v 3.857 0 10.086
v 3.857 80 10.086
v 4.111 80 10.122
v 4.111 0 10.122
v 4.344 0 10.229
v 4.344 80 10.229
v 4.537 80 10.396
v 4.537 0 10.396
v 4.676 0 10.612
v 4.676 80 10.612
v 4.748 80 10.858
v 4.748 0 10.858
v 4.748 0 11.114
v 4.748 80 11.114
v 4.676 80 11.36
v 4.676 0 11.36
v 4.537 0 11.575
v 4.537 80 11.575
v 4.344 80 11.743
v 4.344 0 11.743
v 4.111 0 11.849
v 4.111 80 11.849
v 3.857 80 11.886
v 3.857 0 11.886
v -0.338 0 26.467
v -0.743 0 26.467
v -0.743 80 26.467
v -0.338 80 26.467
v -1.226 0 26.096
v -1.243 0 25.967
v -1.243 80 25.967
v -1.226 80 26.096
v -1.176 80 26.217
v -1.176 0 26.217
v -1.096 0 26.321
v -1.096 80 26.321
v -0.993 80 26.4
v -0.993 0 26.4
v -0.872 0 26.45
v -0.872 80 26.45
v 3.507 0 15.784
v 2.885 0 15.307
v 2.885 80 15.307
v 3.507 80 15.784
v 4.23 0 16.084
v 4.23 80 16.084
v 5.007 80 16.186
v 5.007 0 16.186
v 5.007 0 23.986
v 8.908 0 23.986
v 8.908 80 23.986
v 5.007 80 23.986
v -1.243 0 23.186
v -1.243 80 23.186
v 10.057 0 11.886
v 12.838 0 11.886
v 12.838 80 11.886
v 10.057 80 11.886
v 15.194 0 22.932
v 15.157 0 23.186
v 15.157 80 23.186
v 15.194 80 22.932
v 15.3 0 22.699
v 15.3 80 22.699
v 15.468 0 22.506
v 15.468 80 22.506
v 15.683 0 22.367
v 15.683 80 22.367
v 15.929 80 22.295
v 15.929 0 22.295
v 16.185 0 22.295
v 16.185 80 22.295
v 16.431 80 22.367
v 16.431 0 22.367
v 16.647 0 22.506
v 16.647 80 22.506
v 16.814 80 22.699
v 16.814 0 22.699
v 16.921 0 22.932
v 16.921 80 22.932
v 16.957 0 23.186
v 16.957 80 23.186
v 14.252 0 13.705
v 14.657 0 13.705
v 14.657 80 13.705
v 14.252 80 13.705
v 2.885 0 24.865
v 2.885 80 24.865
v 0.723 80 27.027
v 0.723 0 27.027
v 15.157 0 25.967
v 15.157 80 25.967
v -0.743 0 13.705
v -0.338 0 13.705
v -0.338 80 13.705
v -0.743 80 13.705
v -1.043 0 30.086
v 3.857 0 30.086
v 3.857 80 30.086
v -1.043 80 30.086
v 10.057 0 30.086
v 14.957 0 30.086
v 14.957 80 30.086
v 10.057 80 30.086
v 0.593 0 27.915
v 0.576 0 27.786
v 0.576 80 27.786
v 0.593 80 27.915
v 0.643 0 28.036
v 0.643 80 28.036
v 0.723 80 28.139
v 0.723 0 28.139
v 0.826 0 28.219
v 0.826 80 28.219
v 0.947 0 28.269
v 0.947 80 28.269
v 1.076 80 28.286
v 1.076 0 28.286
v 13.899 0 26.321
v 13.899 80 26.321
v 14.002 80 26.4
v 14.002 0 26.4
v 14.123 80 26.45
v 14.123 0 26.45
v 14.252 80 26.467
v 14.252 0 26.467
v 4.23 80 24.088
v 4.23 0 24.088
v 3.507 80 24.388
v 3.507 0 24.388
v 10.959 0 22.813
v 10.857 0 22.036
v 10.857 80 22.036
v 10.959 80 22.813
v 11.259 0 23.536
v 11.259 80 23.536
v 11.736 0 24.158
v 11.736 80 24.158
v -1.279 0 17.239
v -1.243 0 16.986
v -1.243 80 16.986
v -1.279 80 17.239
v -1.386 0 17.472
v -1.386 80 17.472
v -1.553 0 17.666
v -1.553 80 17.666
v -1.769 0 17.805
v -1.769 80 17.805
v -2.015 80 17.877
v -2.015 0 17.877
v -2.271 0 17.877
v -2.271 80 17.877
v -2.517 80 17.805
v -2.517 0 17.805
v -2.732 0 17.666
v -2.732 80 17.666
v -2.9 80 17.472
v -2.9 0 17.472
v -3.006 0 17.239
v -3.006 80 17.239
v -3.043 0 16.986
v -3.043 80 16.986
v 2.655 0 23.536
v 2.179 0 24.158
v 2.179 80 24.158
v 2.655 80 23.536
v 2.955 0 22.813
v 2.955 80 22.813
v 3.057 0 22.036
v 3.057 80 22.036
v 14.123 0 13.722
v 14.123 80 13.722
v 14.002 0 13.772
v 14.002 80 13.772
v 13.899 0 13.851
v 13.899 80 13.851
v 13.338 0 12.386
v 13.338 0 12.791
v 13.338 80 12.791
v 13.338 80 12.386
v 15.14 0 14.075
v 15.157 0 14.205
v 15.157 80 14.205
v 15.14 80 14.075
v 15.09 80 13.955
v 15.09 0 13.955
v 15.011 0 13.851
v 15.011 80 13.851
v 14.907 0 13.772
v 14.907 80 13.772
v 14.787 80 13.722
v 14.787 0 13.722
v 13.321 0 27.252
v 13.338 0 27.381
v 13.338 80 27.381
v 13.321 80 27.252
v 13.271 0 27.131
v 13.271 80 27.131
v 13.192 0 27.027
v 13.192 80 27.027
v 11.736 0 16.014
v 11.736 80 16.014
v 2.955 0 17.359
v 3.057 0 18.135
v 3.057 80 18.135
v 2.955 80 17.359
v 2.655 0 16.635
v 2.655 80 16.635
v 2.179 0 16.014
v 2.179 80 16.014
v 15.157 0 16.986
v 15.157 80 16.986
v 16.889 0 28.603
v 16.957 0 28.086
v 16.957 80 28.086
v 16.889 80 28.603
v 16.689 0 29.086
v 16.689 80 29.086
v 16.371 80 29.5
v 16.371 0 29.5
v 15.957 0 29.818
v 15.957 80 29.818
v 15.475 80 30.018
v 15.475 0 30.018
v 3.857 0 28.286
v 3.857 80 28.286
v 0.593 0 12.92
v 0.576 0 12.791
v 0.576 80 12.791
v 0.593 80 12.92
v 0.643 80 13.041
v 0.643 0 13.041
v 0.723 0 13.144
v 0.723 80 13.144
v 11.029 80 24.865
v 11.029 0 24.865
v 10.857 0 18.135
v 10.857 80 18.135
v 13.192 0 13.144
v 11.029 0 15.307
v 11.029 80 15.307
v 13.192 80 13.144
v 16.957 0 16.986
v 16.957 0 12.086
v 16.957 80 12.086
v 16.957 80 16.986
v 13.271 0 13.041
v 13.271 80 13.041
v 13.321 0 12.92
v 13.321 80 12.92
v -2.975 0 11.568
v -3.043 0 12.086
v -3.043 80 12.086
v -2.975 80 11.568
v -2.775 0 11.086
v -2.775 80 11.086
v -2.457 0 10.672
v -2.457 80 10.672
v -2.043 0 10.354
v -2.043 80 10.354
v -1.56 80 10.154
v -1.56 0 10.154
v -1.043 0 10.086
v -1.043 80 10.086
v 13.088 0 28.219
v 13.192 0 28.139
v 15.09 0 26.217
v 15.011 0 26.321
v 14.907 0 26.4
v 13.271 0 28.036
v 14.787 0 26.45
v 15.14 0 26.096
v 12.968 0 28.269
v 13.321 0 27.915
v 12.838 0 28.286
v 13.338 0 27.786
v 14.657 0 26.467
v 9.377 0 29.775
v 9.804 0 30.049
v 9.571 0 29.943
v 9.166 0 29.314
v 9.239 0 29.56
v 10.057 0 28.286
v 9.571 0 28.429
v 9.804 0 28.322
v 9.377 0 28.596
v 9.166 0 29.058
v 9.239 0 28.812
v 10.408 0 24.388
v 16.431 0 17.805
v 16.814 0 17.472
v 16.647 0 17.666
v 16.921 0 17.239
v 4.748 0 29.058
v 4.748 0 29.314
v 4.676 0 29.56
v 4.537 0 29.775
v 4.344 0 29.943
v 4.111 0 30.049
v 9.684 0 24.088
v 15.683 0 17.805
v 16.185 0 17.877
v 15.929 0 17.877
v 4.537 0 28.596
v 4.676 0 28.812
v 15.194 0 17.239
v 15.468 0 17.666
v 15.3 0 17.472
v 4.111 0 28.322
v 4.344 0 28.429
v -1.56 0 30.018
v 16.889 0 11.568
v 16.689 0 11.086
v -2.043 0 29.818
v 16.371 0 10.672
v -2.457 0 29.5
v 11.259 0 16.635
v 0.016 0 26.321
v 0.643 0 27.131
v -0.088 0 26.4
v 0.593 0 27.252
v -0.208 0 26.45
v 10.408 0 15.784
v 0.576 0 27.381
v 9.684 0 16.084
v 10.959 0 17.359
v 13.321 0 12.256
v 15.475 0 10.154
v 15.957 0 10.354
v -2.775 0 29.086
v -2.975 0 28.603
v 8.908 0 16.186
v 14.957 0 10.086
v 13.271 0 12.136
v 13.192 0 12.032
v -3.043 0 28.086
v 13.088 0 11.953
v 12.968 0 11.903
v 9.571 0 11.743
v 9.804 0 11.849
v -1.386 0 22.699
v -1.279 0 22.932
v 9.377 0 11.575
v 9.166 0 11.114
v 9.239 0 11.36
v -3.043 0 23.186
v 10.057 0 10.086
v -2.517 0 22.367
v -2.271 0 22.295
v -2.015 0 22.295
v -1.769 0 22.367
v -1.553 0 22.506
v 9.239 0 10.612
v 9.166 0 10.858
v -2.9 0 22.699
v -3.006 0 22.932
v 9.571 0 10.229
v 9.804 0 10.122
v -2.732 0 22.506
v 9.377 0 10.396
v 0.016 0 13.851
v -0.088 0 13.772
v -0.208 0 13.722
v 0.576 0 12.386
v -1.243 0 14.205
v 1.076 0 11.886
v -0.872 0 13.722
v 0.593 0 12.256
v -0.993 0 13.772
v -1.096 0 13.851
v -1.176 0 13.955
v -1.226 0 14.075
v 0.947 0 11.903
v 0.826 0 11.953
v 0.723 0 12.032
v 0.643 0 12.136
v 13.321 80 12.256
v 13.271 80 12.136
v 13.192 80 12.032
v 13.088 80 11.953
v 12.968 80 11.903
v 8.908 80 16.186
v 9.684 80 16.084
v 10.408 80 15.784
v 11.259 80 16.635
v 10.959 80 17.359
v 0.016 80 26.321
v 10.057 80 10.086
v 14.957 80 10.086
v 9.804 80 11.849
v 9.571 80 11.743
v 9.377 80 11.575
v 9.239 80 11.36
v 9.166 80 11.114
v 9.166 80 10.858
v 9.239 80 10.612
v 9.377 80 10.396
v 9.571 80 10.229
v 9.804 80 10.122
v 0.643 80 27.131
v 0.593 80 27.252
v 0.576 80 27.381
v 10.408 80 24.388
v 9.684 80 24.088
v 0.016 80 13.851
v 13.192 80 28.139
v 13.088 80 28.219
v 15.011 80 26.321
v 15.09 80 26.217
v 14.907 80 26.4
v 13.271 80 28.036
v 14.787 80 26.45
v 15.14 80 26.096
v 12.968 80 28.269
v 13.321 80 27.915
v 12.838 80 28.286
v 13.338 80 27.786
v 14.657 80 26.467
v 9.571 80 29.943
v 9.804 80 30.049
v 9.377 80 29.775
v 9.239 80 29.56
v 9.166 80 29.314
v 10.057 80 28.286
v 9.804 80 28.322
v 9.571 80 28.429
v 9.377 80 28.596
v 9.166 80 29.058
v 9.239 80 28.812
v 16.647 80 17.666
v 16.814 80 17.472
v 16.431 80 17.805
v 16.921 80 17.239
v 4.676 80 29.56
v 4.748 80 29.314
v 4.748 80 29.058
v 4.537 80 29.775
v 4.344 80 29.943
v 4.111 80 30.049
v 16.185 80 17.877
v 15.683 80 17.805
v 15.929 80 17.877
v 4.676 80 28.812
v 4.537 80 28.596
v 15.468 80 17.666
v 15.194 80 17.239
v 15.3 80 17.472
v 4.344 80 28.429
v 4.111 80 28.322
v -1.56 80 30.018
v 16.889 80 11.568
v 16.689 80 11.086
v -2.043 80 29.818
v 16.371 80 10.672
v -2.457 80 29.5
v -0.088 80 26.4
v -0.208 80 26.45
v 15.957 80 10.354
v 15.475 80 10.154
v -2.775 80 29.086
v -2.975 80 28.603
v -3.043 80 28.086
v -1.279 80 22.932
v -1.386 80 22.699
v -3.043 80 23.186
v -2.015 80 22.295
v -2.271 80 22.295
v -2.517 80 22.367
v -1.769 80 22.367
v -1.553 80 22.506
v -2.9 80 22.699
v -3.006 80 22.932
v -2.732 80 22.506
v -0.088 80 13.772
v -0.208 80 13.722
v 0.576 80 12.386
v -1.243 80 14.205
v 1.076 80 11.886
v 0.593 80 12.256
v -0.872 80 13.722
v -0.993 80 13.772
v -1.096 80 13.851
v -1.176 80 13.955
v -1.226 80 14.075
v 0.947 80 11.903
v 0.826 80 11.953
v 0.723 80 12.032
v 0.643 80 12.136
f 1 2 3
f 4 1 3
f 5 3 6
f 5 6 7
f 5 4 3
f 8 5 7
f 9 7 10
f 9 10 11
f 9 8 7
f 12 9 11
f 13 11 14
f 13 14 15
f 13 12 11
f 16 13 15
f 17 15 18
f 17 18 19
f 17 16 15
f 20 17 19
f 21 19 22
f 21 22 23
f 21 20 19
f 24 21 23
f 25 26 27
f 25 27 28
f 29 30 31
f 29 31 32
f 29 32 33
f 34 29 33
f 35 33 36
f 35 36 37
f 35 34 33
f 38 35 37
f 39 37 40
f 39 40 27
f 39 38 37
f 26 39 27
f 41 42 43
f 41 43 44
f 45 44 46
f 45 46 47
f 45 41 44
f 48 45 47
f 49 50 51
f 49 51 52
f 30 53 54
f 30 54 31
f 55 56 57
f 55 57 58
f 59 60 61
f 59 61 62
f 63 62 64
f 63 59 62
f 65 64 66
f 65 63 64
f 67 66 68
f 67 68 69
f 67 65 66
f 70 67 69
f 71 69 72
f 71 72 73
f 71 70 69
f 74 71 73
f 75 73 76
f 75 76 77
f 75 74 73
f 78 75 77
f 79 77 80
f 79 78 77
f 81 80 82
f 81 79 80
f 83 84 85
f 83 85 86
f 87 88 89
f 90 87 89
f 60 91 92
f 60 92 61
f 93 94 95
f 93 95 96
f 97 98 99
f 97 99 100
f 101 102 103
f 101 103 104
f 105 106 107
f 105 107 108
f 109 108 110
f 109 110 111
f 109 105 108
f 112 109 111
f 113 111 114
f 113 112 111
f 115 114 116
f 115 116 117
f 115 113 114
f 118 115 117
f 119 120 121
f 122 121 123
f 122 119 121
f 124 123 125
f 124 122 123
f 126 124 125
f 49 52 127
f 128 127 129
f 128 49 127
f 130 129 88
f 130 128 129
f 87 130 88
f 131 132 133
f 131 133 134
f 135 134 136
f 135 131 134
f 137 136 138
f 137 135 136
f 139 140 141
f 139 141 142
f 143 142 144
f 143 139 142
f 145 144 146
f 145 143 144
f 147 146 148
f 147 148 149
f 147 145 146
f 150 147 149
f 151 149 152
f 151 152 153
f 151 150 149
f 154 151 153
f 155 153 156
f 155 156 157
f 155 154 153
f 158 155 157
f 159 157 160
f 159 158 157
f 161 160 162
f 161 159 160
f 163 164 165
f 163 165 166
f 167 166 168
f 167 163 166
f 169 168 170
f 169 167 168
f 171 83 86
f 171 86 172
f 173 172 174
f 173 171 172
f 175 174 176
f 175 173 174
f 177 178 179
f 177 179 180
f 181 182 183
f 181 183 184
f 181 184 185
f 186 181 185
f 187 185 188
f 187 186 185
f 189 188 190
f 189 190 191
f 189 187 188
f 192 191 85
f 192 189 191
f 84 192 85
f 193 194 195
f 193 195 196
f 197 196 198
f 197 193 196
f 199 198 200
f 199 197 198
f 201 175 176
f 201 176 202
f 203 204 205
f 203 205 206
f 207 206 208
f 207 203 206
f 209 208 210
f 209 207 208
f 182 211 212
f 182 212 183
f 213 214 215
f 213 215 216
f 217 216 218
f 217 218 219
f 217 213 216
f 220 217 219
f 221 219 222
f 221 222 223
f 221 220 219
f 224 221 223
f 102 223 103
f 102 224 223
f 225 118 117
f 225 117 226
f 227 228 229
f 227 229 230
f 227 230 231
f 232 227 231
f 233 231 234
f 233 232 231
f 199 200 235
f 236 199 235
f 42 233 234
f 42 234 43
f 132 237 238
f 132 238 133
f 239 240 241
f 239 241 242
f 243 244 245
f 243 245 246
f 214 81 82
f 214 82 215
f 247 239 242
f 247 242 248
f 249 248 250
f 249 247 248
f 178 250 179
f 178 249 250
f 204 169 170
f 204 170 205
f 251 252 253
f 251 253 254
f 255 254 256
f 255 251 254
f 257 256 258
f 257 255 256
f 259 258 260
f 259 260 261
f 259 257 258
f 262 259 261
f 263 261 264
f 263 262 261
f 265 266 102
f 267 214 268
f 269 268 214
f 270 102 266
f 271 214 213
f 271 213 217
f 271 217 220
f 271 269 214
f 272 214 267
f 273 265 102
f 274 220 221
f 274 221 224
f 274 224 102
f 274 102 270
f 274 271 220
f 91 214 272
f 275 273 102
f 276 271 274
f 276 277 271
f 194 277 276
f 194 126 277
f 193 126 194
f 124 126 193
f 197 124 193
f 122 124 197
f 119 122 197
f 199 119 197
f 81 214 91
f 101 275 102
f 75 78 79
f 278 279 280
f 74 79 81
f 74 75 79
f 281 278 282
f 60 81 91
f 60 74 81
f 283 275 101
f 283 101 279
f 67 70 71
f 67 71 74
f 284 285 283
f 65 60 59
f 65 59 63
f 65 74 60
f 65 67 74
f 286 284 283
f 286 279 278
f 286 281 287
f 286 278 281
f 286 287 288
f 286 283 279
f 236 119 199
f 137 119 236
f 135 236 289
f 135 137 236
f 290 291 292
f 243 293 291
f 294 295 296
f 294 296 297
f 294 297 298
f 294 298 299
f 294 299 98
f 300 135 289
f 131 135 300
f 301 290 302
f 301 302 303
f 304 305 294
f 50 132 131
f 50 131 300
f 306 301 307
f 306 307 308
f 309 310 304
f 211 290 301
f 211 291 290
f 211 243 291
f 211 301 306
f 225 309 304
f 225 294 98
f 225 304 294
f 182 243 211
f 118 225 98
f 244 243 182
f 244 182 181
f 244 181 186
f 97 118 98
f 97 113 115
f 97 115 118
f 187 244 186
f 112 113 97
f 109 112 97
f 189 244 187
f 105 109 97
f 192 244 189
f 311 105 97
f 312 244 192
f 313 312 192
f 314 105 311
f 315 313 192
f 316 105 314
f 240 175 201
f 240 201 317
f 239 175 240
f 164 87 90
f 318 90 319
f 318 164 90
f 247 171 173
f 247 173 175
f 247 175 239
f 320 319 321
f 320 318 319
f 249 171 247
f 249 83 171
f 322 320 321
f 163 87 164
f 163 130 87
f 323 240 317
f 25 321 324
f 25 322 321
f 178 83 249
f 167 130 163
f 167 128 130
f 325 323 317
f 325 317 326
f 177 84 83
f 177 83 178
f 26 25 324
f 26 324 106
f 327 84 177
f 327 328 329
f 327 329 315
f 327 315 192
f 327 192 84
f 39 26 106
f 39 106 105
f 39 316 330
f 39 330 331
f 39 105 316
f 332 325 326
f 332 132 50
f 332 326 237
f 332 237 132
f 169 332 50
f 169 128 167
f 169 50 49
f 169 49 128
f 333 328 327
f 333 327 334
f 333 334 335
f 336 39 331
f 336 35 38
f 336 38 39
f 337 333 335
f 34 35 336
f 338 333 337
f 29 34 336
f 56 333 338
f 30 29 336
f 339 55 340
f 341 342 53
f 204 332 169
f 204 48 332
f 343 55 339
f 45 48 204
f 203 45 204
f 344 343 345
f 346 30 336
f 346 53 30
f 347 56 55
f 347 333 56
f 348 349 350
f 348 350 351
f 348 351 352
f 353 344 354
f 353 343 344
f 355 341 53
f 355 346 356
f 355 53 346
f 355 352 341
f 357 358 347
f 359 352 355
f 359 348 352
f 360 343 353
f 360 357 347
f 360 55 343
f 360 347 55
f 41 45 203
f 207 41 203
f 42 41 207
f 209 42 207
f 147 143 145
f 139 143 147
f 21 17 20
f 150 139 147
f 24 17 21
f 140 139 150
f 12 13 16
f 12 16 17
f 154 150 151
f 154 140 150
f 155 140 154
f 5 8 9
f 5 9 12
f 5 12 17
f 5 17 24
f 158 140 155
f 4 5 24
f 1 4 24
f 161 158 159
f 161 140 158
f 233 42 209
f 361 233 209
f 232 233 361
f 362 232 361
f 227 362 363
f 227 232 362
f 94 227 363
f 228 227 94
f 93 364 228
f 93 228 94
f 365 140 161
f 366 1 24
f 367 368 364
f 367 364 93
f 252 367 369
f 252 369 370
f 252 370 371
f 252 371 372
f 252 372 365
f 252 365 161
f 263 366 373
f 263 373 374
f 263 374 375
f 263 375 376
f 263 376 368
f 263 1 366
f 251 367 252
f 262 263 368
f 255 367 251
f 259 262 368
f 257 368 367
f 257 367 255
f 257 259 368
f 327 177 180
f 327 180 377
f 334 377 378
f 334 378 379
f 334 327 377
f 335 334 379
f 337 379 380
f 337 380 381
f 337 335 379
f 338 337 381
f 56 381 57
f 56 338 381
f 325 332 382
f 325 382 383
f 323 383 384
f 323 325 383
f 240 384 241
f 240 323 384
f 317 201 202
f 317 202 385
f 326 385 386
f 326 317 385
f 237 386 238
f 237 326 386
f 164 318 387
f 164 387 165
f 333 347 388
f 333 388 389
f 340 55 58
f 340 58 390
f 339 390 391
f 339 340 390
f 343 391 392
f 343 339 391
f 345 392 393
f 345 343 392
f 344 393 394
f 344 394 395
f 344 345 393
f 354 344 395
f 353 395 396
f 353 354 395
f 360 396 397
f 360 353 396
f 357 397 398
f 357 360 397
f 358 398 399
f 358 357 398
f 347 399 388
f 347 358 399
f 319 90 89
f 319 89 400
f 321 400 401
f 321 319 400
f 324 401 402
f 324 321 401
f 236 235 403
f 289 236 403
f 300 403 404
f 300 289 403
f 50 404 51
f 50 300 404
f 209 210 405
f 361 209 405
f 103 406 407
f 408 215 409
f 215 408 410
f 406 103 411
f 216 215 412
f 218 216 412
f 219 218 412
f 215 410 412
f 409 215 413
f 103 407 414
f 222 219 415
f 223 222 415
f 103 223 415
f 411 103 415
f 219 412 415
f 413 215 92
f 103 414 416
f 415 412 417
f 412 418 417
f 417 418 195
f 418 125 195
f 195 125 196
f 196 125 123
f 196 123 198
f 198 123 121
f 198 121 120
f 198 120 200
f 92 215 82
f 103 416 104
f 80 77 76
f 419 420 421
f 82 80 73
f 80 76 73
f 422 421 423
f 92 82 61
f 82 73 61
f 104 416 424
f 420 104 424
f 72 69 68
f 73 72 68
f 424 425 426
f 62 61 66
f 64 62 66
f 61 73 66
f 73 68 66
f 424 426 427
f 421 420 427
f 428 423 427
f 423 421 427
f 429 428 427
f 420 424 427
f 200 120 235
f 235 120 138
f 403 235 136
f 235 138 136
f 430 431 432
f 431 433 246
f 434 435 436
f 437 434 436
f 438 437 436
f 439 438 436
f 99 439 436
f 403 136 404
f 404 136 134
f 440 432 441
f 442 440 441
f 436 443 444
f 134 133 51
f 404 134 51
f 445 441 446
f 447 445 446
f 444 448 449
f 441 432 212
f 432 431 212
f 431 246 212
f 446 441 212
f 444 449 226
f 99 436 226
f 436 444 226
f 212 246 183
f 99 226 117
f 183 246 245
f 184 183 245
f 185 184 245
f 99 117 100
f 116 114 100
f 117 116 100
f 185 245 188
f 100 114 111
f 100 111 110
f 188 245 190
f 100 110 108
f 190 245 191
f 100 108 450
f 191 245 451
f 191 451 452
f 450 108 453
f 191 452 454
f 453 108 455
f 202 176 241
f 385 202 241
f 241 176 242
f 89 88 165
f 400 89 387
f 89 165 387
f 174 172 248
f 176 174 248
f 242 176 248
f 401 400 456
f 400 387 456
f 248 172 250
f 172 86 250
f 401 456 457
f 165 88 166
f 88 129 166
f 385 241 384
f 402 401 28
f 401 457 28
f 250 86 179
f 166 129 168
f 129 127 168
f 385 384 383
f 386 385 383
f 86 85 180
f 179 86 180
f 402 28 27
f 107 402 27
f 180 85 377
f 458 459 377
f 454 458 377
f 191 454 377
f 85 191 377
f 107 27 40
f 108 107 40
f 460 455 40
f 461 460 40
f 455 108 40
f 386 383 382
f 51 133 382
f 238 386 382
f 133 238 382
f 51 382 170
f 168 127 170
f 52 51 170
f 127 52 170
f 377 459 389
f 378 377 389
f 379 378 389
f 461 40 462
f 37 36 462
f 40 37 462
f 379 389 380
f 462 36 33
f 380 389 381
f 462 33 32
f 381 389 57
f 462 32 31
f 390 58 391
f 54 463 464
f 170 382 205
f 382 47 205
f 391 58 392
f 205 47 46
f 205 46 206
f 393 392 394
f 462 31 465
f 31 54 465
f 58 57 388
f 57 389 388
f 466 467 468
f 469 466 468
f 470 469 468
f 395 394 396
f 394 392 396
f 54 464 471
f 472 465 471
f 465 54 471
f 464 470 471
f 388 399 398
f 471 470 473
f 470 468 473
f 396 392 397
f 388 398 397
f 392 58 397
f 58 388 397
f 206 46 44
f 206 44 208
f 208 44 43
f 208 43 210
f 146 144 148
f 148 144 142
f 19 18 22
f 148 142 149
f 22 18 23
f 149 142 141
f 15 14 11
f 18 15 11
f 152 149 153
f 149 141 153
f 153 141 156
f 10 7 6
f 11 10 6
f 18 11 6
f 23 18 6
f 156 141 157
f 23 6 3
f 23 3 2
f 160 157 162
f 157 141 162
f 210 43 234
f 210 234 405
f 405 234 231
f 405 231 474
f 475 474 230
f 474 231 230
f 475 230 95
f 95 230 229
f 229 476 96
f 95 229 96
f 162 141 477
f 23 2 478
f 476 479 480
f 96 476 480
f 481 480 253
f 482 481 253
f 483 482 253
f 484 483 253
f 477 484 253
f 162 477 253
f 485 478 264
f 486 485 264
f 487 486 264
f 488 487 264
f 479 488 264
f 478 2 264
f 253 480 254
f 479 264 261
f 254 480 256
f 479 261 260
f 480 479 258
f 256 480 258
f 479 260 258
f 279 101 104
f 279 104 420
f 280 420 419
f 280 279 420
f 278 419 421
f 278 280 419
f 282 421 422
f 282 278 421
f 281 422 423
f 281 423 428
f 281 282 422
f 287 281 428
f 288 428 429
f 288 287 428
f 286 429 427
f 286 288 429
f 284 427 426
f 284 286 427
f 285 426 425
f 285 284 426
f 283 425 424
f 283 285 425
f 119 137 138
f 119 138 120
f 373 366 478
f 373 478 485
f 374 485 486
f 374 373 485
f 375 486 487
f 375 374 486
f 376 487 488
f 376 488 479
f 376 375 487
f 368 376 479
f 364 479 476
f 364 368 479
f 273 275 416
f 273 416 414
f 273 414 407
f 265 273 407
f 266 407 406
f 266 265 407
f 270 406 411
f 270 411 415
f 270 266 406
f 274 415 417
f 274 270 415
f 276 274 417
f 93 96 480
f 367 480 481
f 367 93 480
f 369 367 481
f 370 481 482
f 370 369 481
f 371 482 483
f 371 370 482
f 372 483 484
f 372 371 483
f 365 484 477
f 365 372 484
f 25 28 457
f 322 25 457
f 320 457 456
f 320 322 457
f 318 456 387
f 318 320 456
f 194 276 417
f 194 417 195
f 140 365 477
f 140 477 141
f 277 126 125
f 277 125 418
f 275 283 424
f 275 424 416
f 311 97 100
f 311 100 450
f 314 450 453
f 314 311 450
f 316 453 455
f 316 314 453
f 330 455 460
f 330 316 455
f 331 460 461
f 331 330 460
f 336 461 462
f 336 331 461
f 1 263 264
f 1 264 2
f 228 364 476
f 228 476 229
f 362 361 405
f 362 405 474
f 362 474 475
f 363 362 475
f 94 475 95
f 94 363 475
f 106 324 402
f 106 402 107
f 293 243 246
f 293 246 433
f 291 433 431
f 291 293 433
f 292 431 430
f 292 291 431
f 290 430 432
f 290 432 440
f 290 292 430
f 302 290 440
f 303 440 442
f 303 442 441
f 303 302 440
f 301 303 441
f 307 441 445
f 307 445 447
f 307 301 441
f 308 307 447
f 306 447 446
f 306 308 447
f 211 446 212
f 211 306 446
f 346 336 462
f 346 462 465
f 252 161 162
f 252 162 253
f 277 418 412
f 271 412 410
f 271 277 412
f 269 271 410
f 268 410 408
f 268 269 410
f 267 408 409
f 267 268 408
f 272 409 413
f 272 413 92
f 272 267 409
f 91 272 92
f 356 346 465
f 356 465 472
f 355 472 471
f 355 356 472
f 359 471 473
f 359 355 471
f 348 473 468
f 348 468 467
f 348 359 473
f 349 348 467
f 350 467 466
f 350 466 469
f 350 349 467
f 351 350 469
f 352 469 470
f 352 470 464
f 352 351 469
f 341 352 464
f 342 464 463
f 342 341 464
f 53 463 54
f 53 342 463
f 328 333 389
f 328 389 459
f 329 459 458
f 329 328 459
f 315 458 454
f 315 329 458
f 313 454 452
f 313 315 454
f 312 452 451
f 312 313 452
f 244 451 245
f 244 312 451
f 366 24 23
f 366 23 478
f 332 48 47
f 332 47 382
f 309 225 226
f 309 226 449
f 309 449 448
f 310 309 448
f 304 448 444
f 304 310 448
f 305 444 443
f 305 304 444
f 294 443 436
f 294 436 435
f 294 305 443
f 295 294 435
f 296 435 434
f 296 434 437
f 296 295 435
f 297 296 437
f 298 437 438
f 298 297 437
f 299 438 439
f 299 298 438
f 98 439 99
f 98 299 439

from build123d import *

# Parameters (mm, degrees)
EXTRUDE_1_DEPTH = 80


with BuildPart() as part:
    # 草图1 → 凸台-拉伸1 (new body)
    with BuildSketch(Plane(origin=(0, 0, 0), x_dir=(1, 0, 0), z_dir=(0, 1, 0))):
        with BuildLine():
            Line((-1.042752475, -10.085861632), (3.857247525, -10.085861632))
            ThreePointArc((3.857247525, -10.085861632), (4.757247525, -10.985861632), (3.857247525, -11.885861632))
            Line((3.857247525, -11.885861632), (1.076161722, -11.885861632))
            ThreePointArc((1.076161722, -11.885861632), (0.722608332, -12.032308241), (0.576161722, -12.385861632))
            Line((0.576161722, -12.385861632), (0.576161722, -12.790788968))
            ThreePointArc((0.576161722, -12.790788968), (0.614221956, -12.982130685), (0.722608332, -13.144342359))
            Line((0.722608332, -13.144342359), (2.885447948, -15.307181975))
            ThreePointArc((2.885447948, -15.307181975), (3.858717994, -15.957500229), (5.006768291, -16.185861632))
            Line((5.006768291, -16.185861632), (8.907726758, -16.185861632))
            ThreePointArc((8.907726758, -16.185861632), (10.055777055, -15.957500229), (11.029047102, -15.307181975))
            Line((11.029047102, -15.307181975), (13.191886718, -13.144342359))
            ThreePointArc((13.191886718, -13.144342359), (13.300273094, -12.982130685), (13.338333327, -12.790788968))
            Line((13.338333327, -12.790788968), (13.338333327, -12.385861632))
            ThreePointArc((13.338333327, -12.385861632), (13.191886718, -12.032308241), (12.838333327, -11.885861632))
            Line((12.838333327, -11.885861632), (10.057247525, -11.885861632))
            ThreePointArc((10.057247525, -11.885861632), (9.157247525, -10.985861632), (10.057247525, -10.085861632))
            Line((10.057247525, -10.085861632), (14.957247525, -10.085861632))
            ThreePointArc((14.957247525, -10.085861632), (16.371461087, -10.671648069), (16.957247525, -12.085861632))
            Line((16.957247525, -12.085861632), (16.957247525, -16.985861632))
            ThreePointArc((16.957247525, -16.985861632), (16.057247525, -17.885861632), (15.157247525, -16.985861632))
            Line((15.157247525, -16.985861632), (15.157247525, -14.204775829))
            ThreePointArc((15.157247525, -14.204775829), (15.010800915, -13.851222438), (14.657247525, -13.704775829))
            Line((14.657247525, -13.704775829), (14.252320188, -13.704775829))
            ThreePointArc((14.252320188, -13.704775829), (14.060978472, -13.742836063), (13.898766797, -13.851222438))
            Line((13.898766797, -13.851222438), (11.735927181, -16.014062054))
            ThreePointArc((11.735927181, -16.014062054), (11.085608927, -16.987332101), (10.857247525, -18.135382398))
            Line((10.857247525, -18.135382398), (10.857247525, -22.036340865))
            ThreePointArc((10.857247525, -22.036340865), (11.085608927, -23.184391162), (11.735927181, -24.157661209))
            Line((11.735927181, -24.157661209), (13.898766797, -26.320500825))
            ThreePointArc((13.898766797, -26.320500825), (14.060978472, -26.4288872), (14.252320188, -26.466947434))
            Line((14.252320188, -26.466947434), (14.657247525, -26.466947434))
            ThreePointArc((14.657247525, -26.466947434), (15.010800915, -26.320500825), (15.157247525, -25.966947434))
            Line((15.157247525, -25.966947434), (15.157247525, -23.185861632))
            ThreePointArc((15.157247525, -23.185861632), (16.057247525, -22.285861632), (16.957247525, -23.185861632))
            Line((16.957247525, -23.185861632), (16.957247525, -28.085861632))
            ThreePointArc((16.957247525, -28.085861632), (16.371461087, -29.500075194), (14.957247525, -30.085861632))
            Line((14.957247525, -30.085861632), (10.057247525, -30.085861632))
            ThreePointArc((10.057247525, -30.085861632), (9.157247525, -29.185861632), (10.057247525, -28.285861632))
            Line((10.057247525, -28.285861632), (12.838333327, -28.285861632))
            ThreePointArc((12.838333327, -28.285861632), (13.191886718, -28.139415022), (13.338333327, -27.785861632))
            Line((13.338333327, -27.785861632), (13.338333327, -27.380934295))
            ThreePointArc((13.338333327, -27.380934295), (13.300273094, -27.189592579), (13.191886718, -27.027380904))
            Line((13.191886718, -27.027380904), (11.029047102, -24.864541288))
            ThreePointArc((11.029047102, -24.864541288), (10.055777055, -24.214223034), (8.907726758, -23.985861632))
            Line((8.907726758, -23.985861632), (5.006768291, -23.985861632))
            ThreePointArc((5.006768291, -23.985861632), (3.858717994, -24.214223034), (2.885447948, -24.864541288))
            Line((2.885447948, -24.864541288), (0.722608332, -27.027380904))
            ThreePointArc((0.722608332, -27.027380904), (0.614221956, -27.189592579), (0.576161722, -27.380934295))
            Line((0.576161722, -27.380934295), (0.576161722, -27.785861632))
            ThreePointArc((0.576161722, -27.785861632), (0.722608332, -28.139415022), (1.076161722, -28.285861632))
            Line((1.076161722, -28.285861632), (3.857247525, -28.285861632))
            ThreePointArc((3.857247525, -28.285861632), (4.757247525, -29.185861632), (3.857247525, -30.085861632))
            Line((3.857247525, -30.085861632), (-1.042752475, -30.085861632))
            ThreePointArc((-1.042752475, -30.085861632), (-2.456966038, -29.500075194), (-3.042752475, -28.085861632))
            Line((-3.042752475, -28.085861632), (-3.042752475, -23.185861632))
            ThreePointArc((-3.042752475, -23.185861632), (-2.142752475, -22.285861632), (-1.242752475, -23.185861632))
            Line((-1.242752475, -23.185861632), (-1.242752475, -25.966947434))
            ThreePointArc((-1.242752475, -25.966947434), (-1.096305866, -26.320500825), (-0.742752475, -26.466947434))
            Line((-0.742752475, -26.466947434), (-0.337825138, -26.466947434))
            ThreePointArc((-0.337825138, -26.466947434), (-0.146483422, -26.4288872), (0.015728252, -26.320500825))
            Line((0.015728252, -26.320500825), (2.178567868, -24.157661209))
            ThreePointArc((2.178567868, -24.157661209), (2.828886122, -23.184391162), (3.057247525, -22.036340865))
            Line((3.057247525, -22.036340865), (3.057247525, -18.135382398))
            ThreePointArc((3.057247525, -18.135382398), (2.828886122, -16.987332101), (2.178567868, -16.014062054))
            Line((2.178567868, -16.014062054), (0.015728252, -13.851222438))
            ThreePointArc((0.015728252, -13.851222438), (-0.146483422, -13.742836063), (-0.337825138, -13.704775829))
            Line((-0.337825138, -13.704775829), (-0.742752475, -13.704775829))
            ThreePointArc((-0.742752475, -13.704775829), (-1.096305866, -13.851222438), (-1.242752475, -14.204775829))
            Line((-1.242752475, -14.204775829), (-1.242752475, -16.985861632))
            ThreePointArc((-1.242752475, -16.985861632), (-2.142752475, -17.885861632), (-3.042752475, -16.985861632))
            Line((-3.042752475, -16.985861632), (-3.042752475, -12.085861632))
            ThreePointArc((-3.042752475, -12.085861632), (-2.456966038, -10.671648069), (-1.042752475, -10.085861632))
        make_face()
    extrude(amount=EXTRUDE_1_DEPTH)


solid = part.part
